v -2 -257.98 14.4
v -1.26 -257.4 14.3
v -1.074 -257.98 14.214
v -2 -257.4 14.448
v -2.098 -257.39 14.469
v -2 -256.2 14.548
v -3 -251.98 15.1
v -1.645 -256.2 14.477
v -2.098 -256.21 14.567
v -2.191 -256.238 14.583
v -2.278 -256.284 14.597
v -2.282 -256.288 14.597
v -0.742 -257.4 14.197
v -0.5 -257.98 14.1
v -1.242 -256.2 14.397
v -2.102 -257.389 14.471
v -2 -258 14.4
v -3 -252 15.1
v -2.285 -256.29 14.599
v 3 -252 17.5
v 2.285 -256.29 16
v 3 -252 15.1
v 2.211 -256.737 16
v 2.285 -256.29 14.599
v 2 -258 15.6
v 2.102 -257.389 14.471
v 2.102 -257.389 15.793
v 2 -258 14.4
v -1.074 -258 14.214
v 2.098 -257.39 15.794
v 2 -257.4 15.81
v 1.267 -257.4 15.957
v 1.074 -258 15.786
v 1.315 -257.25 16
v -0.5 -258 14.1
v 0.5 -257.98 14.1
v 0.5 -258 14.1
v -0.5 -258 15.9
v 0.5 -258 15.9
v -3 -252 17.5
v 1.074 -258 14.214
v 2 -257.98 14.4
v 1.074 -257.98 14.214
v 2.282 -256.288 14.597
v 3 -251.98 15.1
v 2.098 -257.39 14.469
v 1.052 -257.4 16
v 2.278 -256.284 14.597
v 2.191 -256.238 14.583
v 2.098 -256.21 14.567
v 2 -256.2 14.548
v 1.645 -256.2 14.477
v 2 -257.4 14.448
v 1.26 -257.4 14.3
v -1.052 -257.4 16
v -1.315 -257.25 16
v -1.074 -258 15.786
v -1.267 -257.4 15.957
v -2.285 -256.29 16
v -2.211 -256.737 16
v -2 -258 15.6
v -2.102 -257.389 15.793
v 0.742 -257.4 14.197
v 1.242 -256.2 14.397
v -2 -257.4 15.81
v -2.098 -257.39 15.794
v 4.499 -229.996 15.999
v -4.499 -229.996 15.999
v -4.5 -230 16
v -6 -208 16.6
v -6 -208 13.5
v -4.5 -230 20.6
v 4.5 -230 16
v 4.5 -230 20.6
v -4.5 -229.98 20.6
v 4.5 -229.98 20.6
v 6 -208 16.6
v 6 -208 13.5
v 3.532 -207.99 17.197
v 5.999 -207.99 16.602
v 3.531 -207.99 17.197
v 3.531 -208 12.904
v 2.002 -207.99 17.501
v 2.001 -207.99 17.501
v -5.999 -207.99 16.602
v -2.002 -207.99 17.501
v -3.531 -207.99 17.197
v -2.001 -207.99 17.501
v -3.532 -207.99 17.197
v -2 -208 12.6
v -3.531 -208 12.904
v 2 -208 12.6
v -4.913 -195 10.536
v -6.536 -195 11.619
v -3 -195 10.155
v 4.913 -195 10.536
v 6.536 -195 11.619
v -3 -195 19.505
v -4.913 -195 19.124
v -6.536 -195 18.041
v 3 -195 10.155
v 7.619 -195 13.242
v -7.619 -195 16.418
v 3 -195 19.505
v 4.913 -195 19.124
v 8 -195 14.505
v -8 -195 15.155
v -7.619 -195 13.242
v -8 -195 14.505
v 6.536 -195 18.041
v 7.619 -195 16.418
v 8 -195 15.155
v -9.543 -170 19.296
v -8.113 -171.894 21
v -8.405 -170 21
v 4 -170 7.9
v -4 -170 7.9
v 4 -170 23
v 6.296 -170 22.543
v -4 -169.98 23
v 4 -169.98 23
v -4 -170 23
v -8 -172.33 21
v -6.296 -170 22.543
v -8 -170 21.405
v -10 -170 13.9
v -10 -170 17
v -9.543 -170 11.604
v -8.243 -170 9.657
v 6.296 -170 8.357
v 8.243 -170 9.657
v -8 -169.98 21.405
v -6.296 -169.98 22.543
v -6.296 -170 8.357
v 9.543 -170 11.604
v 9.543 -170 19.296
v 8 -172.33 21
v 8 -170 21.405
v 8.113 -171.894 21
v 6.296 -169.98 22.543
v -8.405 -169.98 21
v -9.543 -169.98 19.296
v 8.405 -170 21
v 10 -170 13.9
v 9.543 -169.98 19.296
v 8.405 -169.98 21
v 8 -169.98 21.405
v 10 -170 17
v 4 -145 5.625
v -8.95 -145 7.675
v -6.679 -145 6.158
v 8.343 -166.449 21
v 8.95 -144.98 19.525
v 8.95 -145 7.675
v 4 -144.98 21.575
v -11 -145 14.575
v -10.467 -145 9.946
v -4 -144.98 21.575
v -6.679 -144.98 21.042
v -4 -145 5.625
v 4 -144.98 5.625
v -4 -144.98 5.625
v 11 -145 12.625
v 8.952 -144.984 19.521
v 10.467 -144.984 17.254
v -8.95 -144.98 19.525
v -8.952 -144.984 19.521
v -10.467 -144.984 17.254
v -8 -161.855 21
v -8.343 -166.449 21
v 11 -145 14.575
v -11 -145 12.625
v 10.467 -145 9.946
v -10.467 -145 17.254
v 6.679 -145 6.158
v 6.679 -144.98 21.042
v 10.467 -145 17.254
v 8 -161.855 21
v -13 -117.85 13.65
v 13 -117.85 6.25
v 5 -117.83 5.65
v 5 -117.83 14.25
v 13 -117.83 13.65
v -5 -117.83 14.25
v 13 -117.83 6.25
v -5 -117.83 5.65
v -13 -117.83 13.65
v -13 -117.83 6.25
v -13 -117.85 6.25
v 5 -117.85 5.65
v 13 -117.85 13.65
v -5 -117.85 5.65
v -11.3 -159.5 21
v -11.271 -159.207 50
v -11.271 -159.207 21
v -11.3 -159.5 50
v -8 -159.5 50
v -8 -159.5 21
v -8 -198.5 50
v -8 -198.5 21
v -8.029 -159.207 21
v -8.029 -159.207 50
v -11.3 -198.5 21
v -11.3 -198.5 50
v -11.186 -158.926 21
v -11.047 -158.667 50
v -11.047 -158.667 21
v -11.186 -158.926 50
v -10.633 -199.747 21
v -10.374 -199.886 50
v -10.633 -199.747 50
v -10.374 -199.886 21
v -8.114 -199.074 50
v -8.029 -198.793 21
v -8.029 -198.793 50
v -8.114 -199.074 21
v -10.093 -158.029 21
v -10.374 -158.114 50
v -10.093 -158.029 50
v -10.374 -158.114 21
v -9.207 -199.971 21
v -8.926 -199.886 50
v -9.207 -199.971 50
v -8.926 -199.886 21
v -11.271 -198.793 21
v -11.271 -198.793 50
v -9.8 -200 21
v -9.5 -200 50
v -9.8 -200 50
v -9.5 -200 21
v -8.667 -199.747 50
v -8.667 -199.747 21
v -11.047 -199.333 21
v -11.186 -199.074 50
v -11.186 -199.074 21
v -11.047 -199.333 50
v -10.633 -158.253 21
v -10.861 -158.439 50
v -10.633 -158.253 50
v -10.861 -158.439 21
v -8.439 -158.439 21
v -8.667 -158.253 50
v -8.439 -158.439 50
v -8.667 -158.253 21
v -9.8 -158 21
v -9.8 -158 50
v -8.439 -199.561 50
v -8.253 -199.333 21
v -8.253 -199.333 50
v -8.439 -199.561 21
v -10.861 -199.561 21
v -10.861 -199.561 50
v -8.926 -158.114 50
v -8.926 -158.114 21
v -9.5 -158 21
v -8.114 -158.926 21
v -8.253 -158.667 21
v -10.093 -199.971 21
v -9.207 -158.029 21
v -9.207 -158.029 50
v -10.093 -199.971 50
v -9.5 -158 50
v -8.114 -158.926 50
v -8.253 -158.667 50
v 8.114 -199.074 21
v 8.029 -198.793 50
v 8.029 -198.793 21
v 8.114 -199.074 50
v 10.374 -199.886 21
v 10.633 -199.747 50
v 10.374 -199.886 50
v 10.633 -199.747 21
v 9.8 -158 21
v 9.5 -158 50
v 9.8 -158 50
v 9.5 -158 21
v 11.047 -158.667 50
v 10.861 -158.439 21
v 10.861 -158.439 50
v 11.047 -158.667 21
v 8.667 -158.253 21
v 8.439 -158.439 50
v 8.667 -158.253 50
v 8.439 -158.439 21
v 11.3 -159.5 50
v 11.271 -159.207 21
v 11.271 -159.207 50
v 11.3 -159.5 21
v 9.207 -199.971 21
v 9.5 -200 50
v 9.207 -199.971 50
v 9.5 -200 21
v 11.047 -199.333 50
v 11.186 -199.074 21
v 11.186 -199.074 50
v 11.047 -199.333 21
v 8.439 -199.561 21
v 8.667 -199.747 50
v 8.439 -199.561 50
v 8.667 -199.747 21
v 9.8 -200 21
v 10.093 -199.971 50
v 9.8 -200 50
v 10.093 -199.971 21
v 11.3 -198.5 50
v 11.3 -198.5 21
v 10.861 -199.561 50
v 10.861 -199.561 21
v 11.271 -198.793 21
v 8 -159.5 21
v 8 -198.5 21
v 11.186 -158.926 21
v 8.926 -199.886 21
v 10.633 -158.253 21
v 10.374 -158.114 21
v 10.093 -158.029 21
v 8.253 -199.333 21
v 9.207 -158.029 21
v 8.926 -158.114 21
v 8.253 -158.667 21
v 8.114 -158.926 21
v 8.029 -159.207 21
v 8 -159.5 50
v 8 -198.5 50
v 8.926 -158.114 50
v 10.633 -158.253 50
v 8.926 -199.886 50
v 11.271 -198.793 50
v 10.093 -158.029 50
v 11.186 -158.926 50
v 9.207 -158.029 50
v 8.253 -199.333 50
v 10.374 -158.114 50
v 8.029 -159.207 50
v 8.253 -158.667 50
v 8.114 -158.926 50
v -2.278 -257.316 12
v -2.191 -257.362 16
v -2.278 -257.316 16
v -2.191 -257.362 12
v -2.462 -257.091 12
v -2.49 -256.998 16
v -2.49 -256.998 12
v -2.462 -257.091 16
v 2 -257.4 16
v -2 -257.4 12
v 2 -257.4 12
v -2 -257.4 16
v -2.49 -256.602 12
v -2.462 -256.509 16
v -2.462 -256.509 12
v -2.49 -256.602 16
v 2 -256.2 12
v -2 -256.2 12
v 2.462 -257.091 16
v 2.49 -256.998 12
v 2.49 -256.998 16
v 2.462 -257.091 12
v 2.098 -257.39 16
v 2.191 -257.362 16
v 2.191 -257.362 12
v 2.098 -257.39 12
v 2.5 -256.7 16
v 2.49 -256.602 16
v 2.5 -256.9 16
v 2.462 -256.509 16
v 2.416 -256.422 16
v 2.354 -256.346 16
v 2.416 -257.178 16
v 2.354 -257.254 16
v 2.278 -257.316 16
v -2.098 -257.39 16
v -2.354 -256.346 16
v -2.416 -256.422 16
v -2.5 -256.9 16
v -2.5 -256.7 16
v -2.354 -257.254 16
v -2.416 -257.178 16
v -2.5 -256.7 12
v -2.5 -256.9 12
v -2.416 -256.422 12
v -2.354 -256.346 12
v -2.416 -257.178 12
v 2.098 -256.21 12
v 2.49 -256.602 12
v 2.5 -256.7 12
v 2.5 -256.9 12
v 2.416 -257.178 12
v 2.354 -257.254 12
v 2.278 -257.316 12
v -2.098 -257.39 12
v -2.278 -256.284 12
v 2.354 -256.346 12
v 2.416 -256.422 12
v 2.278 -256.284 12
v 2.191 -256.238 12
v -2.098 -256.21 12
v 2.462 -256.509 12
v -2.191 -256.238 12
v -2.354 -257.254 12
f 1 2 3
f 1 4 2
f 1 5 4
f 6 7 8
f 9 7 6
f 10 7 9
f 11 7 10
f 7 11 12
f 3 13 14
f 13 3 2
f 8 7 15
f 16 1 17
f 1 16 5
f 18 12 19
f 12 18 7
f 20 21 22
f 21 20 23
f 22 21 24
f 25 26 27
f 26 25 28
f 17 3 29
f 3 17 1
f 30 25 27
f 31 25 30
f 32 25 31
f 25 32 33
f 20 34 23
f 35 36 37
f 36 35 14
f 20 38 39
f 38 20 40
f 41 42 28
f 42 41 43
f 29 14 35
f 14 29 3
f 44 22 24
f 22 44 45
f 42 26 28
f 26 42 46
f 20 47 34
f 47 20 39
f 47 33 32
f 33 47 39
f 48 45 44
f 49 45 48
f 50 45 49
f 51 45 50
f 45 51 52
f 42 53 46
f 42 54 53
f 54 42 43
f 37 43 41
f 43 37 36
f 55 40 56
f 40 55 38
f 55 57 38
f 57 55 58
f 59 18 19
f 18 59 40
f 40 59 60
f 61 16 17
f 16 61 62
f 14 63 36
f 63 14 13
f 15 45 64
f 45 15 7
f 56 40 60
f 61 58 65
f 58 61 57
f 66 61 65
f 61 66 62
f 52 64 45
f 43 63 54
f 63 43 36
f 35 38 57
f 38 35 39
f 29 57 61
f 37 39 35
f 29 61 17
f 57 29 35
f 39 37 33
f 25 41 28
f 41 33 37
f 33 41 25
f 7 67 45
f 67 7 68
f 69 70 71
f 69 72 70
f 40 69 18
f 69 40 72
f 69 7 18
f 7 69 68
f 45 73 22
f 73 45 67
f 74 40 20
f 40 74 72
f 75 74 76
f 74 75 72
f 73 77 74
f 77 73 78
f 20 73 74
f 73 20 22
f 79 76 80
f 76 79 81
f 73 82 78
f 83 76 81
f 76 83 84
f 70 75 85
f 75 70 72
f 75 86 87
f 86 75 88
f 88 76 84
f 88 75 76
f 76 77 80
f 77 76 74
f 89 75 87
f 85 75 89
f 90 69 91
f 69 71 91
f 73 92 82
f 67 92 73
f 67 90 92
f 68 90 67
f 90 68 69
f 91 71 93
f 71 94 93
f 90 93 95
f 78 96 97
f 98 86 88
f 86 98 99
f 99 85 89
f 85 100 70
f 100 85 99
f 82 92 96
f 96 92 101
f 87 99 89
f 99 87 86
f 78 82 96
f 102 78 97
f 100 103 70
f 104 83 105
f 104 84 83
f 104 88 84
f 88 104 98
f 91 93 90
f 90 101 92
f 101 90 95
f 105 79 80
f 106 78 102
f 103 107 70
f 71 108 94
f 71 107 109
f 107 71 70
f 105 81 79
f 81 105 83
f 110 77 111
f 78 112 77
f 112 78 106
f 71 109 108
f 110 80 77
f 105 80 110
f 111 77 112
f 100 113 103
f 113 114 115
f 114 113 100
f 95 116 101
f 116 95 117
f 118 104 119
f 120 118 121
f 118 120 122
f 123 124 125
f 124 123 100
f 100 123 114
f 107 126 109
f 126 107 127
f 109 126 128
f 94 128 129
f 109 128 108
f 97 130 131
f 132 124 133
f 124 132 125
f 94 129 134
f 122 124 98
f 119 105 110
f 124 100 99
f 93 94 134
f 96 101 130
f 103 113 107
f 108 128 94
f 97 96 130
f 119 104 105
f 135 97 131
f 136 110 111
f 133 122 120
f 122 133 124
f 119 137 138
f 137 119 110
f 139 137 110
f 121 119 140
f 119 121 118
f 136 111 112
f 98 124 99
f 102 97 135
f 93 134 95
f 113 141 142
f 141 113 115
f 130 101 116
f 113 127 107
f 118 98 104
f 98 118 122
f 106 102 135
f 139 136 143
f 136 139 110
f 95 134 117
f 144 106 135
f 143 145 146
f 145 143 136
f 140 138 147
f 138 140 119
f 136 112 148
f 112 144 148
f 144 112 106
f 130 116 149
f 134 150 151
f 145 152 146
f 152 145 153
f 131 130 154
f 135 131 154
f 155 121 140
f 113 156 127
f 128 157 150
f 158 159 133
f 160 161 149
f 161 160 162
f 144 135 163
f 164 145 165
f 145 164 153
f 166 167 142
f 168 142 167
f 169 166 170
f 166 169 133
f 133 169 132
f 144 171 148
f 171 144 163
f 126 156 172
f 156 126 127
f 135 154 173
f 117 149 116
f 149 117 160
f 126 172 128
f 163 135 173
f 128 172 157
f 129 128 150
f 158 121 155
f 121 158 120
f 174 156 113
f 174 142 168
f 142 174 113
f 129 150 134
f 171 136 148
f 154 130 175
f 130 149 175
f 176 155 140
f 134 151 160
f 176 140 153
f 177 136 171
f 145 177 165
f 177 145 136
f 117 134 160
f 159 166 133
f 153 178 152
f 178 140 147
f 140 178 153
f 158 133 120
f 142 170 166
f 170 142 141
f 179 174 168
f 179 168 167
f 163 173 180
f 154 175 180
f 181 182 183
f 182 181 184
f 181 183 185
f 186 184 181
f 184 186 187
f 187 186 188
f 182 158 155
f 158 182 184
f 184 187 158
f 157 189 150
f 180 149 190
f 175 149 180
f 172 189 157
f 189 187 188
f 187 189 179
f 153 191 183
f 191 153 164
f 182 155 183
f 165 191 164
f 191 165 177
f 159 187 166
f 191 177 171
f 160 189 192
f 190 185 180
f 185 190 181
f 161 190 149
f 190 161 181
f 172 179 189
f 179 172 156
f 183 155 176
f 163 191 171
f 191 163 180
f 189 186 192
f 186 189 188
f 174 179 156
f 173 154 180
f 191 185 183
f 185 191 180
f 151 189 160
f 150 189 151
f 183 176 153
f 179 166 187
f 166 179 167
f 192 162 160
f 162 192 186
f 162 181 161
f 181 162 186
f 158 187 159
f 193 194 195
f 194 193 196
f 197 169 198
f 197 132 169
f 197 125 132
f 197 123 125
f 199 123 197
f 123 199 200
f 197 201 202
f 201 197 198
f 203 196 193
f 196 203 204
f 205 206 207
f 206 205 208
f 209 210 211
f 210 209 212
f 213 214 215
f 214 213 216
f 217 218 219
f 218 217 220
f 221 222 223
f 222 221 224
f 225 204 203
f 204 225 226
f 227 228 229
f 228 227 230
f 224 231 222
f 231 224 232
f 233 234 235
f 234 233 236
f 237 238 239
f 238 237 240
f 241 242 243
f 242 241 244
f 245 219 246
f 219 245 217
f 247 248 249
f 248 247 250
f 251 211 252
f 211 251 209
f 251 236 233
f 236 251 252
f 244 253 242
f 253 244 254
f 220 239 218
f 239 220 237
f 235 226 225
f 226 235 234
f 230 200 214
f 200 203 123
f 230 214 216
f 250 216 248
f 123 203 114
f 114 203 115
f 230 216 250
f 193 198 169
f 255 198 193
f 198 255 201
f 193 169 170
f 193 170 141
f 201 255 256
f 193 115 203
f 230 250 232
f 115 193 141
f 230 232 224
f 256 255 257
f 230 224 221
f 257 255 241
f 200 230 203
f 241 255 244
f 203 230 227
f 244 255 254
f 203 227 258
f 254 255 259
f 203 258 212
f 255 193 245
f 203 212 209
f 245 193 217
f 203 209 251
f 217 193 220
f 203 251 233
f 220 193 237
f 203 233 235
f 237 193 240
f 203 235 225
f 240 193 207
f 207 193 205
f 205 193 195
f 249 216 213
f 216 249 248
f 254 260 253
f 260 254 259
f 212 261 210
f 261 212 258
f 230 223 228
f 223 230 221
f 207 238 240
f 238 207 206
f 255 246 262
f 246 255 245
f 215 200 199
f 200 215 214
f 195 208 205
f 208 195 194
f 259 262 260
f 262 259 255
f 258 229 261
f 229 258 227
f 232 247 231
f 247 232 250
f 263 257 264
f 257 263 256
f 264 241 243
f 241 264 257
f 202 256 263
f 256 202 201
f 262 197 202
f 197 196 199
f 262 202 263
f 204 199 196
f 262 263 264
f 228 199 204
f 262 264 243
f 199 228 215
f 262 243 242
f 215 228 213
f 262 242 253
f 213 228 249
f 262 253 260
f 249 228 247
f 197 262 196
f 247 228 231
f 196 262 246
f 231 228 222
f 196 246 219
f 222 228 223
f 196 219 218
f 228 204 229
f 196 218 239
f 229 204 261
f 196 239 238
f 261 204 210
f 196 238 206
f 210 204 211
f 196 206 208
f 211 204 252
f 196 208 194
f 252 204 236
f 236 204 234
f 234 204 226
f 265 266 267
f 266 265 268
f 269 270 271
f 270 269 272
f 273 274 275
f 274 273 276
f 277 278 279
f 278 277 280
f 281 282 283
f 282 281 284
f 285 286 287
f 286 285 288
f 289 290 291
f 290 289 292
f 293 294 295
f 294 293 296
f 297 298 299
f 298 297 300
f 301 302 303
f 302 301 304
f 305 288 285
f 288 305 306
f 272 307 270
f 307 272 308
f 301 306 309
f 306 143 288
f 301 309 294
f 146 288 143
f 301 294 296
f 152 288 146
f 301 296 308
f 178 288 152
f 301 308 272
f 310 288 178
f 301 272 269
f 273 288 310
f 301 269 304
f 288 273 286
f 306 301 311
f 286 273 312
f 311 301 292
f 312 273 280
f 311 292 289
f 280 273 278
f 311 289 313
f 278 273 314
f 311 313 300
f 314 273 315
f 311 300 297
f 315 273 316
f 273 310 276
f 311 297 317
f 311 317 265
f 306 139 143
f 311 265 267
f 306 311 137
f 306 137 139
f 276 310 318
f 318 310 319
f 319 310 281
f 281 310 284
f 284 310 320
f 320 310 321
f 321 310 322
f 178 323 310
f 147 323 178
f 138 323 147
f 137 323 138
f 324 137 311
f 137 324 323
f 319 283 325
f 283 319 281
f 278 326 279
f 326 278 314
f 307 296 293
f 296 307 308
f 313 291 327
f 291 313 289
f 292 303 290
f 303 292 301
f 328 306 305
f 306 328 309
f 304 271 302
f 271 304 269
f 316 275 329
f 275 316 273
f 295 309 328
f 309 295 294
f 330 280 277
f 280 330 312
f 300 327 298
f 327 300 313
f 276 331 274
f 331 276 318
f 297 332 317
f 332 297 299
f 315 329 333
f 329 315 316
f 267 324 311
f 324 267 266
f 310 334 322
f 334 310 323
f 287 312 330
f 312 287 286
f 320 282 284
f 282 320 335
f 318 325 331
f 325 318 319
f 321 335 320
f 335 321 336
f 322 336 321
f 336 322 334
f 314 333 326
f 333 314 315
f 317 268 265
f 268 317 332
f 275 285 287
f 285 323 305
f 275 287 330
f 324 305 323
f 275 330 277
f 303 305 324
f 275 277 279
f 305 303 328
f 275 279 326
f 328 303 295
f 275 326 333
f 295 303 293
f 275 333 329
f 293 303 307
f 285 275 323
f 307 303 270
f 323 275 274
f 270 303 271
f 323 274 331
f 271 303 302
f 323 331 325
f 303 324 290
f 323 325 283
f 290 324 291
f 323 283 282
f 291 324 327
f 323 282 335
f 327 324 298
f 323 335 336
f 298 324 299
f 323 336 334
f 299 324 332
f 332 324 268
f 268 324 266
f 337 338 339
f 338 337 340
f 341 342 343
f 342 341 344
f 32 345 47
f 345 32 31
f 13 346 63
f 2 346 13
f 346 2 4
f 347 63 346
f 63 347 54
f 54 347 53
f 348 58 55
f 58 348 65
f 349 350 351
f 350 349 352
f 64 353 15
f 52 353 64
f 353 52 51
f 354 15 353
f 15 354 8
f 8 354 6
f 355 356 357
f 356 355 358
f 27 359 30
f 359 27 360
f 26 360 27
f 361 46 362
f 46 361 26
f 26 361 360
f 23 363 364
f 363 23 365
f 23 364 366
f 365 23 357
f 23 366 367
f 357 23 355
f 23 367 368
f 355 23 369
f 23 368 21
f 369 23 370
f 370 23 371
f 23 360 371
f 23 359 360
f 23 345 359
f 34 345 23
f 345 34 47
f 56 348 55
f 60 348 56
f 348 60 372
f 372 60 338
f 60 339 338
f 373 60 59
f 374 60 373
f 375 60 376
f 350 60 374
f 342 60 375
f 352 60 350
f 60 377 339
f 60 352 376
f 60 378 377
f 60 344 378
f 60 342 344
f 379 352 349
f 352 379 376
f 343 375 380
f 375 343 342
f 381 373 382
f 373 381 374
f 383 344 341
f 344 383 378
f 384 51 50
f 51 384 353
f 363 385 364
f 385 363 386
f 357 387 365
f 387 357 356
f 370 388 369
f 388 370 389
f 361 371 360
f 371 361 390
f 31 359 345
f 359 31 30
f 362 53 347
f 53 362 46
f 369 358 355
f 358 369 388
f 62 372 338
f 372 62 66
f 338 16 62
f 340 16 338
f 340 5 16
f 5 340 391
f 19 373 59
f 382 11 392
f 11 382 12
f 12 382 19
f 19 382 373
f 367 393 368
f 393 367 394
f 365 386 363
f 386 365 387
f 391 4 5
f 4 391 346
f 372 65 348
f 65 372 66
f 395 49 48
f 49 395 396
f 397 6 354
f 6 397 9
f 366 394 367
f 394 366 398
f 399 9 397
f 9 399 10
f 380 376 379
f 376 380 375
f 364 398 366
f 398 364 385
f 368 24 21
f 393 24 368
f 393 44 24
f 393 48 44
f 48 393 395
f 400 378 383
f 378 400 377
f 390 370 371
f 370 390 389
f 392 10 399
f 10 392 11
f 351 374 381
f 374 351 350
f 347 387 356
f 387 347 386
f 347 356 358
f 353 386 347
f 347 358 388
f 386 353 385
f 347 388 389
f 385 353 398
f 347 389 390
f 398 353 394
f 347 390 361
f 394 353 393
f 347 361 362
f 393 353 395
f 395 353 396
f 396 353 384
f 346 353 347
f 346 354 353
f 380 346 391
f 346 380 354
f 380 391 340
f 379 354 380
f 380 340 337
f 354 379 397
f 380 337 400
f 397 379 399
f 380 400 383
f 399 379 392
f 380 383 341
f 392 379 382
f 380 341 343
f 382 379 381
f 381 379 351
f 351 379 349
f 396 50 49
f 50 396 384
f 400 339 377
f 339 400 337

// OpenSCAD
// file: ../lib.scad
// ===== 공용 프리미티브 (params 의존 없음 — use로 포함. 함정 1) =====

// 두 점을 잇는 캡슐. 끝단이 od/2 만큼 뻗는다 (함정 3)
module rod(p1, p2, od, fn = 56)
    hull() { translate(p1) sphere(d = od, $fn = fn);
             translate(p2) sphere(d = od, $fn = fn); }

function mir(p, s = 1) = [s * p.x, p.y, p.z];

// --- 라운디드 사각 2D 폴리곤 (CCW) ---
function arc_pt(cx, cy, r, a) = [cx + r * cos(a), cy + r * sin(a)];
function rrpts(w, h, r, n = 4) =
    let (x = w / 2 - r, y = h / 2 - r)
    concat(
        [for (i = [0:n]) arc_pt( x, -y, r, -90 + 90 * i / n)],
        [for (i = [0:n]) arc_pt( x,  y, r,   0 + 90 * i / n)],
        [for (i = [0:n]) arc_pt(-x,  y, r,  90 + 90 * i / n)],
        [for (i = [0:n]) arc_pt(-x, -y, r, 180 + 90 * i / n)]);

// y 위치의 XZ 단면 슬래브 (중심 x0/zc, 폭 w/높이 h, 모서리 r).
// 회전 매핑: 2D x→차량 X, 2D y→차량 Z, 돌출 +z→−Y (y..y+0.02 전방 전용, 함정 20)
module slabr(y, x0, w, h, zc, r)
    translate([x0, y + 0.02, zc]) rotate([90, 0, 0])
        linear_extrude(0.02) polygon(rrpts(w, h, r));

// 단면 체인 loft: sec = [[y, x0, w, h, zc, r], ...]
module loftr(sec)
    for (i = [0 : len(sec) - 2])
        hull() {
            slabr(sec[i][0],     sec[i][1],     sec[i][2],     sec[i][3],     sec[i][4],     sec[i][5]);
            slabr(sec[i + 1][0], sec[i + 1][1], sec[i + 1][2], sec[i + 1][3], sec[i + 1][4], sec[i + 1][5]);
        }

// 라운디드 박스 (z0..z1 수직, 평면 모서리 r)
module rbox(xc, yc, z0, z1, dx, dy, r, fn = 32)
    hull() for (px = [-1, 1], py = [-1, 1])
        translate([xc + px * (dx / 2 - r), yc + py * (dy / 2 - r), z0])
            cylinder(r = r, h = z1 - z0, $fn = fn);

// --- NACA 계열 에어포일 (LE 원점, 2D +x = 현 방향) ---
function _yt(x, c, t) = 5 * t * c * (0.2969*sqrt(x) - 0.1260*x - 0.3516*x*x
    + 0.2843*x*x*x - 0.1036*x*x*x*x);
function _yc(x, c, m) = 4 * m * c * x * (1 - x);
function naca_pts(c, t, m, n = 12) =
    concat(
        [for (i = [0:n])     let (x = i / n)     [x*c,  _yt(x, c, t) + _yc(x, c, m)]],
        [for (i = [n-1:-1:0]) let (x = i / n)    [x*c, -_yt(x, c, t) + _yc(x, c, m)]]);

// 슬라이스 3D 링: v=[x, yle, zle, c, aoa, th, cam] → 받각 회전된 naca 점의 링
// (th/cam은 mm — 현 대비 비율로 정규화)
function wring(v, n = 12) =
    let (c = v[3], t = v[5] / c, m = v[6] / c, pts = naca_pts(c, t, m, n),
         ca = cos(v[4]), sa = sin(v[4]))
    // 코드 방향 (ca,sa) + 두께/캠버 수직 방향 (-sa,ca) — 2D y 누락 금지
    [for (p = pts) [v[0], v[1] + p[0] * ca - p[1] * sa, v[2] + p[0] * sa + p[1] * ca]];

// 진짜 로프트 윙 — polyhedron 스트립. hull 체인은 캠버진 하면을 볼록 껍질로
// 채워(LE→TE 직선 웨지) 요소가 처지므로 쓰지 않는다
module wing3(sl, n = 12) {
    rings = [for (v = sl) wring(v, n)];
    ns = len(rings);
    m = len(rings[0]);
    pts = [for (r = rings, p = r) p];
    function ix(i, k) = i * m + (k % m);
    faces = concat(
        // 측면 스트립 (사중면 → 삼각형 2) — 외향 노멀 권선(캡과 일치)
        [for (i = [0 : ns - 2], k = [0 : m - 1])
            each [[ix(i, k), ix(i, k + 1), ix(i + 1, k + 1)],
                  [ix(i, k), ix(i + 1, k + 1), ix(i + 1, k)]]],
        // 끝 캡 (링은 단순 폴리곤 — 팬 삼각분할)
        [for (k = [1 : m - 2]) [ix(0, 0), ix(0, k + 1), ix(0, k)]],
        [for (k = [1 : m - 2]) [ix(ns - 1, 0), ix(ns - 1, k), ix(ns - 1, k + 1)]]
    );
    polyhedron(points = pts, faces = faces, convexity = 4);
}

// 반쪽 슬라이스 → x-대칭 전체. 규약: half는 센터(x=0)→팁 순서(내림차순 x).
// 결과는 x 오름차순 체인. x=0 센터만 중복 제외 (그 외 전부 미러)
function wsym(half) =
    concat([for (i = [len(half) - 1 : -1 : 0]) half[i]],
           [for (i = [0 : len(half) - 1]) if (abs(half[i][0]) > 1e-9)
               concat([-half[i][0]], [for (j = [1 : len(half[i]) - 1]) half[i][j]])]);

// 환(링), 축 Z
module ann(r_in, r_out, h, fn = 96)
    difference() { cylinder(r = r_out, h = h, center = true, $fn = fn);
                   cylinder(r = r_in,  h = h + 2, center = true, $fn = fn); }

// 리스트 전체 x반전+순서 역행 (센터 구간 없는 플랩 등 — 좌우 별도 wing3 호출용).
// x반전만 하면 행렬식이 음수가 되어 권선이 뒤집힌다 → 순서 역행으로 상쇄
function msym(half) =
    [for (i = [len(half) - 1 : -1 : 0])
        concat([-half[i][0]], [for (j = [1 : len(half[i]) - 1]) half[i][j]])];
// file: ../params.scad
// =====================================================================
// F1 그랜드파이언스 카 1:10 — 전체 파라미터 (유일한 수정 지점)
// 좌표계: +Y 전방, +X 좌측, +Z 상방, 지면 z=0, 원점=휠베이스 중심
// 전장 558 (y -268..+278), 전폭 194, 휠베이스 360, 타이어 OD 72 (720mm)
// 30부품. loftr 단면 = [y, x0, w, h, zc, r] (XZ 단면, y..y+0.02 슬래브)
// wing3 슬라이스 = [x, yle, zle, c, aoa, th, cam]
//   aoa: 현 방향의 X축 회전각. 전방 받각 요소는 165~170 (TE가 뒤+위)
// =====================================================================
$fn = 96;

// -- 휠/액슬 (실차 720mm 타이어, 18인치 림, 트랙 F1600/R1550) --
AXF_Y = 180;   AXR_Y = -180;
WHF_X = 80;    WHR_X = 77.5;
WH_Z  = 36;
TIRF_W = 30.5; TIRR_W = 40.5;  TIR_R = 36;
TIR_FN = 288;                 // 타이어 회전체 해상도
RIM_R = 23.2;  RIM_T = 1.0;   // 림 배럴 반경/두께
RIM_LF = 12.4; RIM_LR = 17.4; // 림 배럴 반폭
HUB_BORE = 7.0; STUB_D = 6.2; // 방사 간극 0.4
DISC_R = 15.5;                // 브레이크 디스크

// -- 바디 공통 레벨 --
FLO_Z0 = 2.0;  FLO_Z1 = 5.5;  // 플로어 (두께 3.5)
BOD_Z0 = 5.65;                // 샤시/카버/기어박스 바닥 (플로어 위 0.15)
J = 0.15;                     // 부품 접합 기본 간극
ARM_OD = 3.4;                 // 서스펜션 암 캡슐 직경

// ===== 01 플로어 =====
FLOOR_SEC = [
    [132,    0,  92, 3.5, 3.75, 1.5], [100, 0, 118, 3.5, 3.75, 1.5],
    [60,     0, 130, 3.5, 3.75, 2.0], [10,  0, 132, 3.5, 3.75, 2.0],
    [-60,    0, 128, 3.5, 3.75, 2.0], [-120, 0, 112, 3.5, 3.75, 2.0],
    [-161.85, 0, 100, 3.5, 3.75, 2.0]];

// ===== 02 디퓨저 (램프 + 스트레이크는 부품 내부) =====
DIFF_SEC = [
    [-230,   0, 100, 10.0, 11.0, 1.5], [-215, 0, 100, 8.0,  9.0, 1.5],
    [-190,   0, 100,  6.0,  6.2, 1.5], [-162.0, 0, 100, 4.0, 4.15, 1.5]];
DIFF_TOP = [[-175, 7.8], [-205, 11.9], [-228, 15.6]];  // (y, 램프 상면 z)

// ===== 03 플로어 에지 윙 =====
FEW_SEC = [   // [y, x0, w, h, zc, r] — x0 부호로 좌우
    [55,   63.5, 3.0, 2.0, 6.65, 1.0], [-5,  65.5, 3.0, 5.5, 8.40, 1.5],
    [-70,  63.0, 3.0, 4.0, 7.65, 1.5], [-120, 58.0, 3.0, 3.0, 7.15, 1.5]];
FEW2_SEC = [
    [100, 57.0, 2.5, 1.5, 6.40, 0.8], [60, 60.0, 2.5, 2.0, 6.65, 0.8]];

// ===== 04 노우즈 =====
NOSE_SEC = [
    [95,   0, 38, 28, 25.3, 12], [100,  0, 38, 29, 25.3, 12],
    [115,  0, 36, 28, 23.8, 11], [135,  0, 31, 24, 21.3,  9],
    [160,  0, 27, 20, 18.3,  8], [185,  0, 23, 17, 15.8,  7],
    [205,  0, 20, 15, 14.3,  6], [224,  0, 17, 12, 12.3,  5],
    [242,  0, 14,  9, 10.8,  4], [258,  0, 10,  7, 10.1,  3],
    [272,  0,  4.5, 4.5, 9.8, 2], [273.5, 0, 1.2, 1.2, 9.8, 0.6]];

// ===== 05 샤시(모노코크) + 콕핏 컷 =====
CHAS_SEC = [
    [-34.85, 0, 46, 44, 27.65, 15], [-10, 0, 48, 46, 28.65, 15],
    [20,     0, 48, 44, 27.65, 15], [60,  0, 46, 40, 25.65, 14],
    [94.85,  0, 42, 34, 22.65, 12]];
CKP_CUT = [[62, 0, 34, 32, 46, 3], [-30, 0, 34, 30, 45, 3]];

// ===== 06 엔진 커버 + 샤크핀 =====
COV_SEC = [
    [-152,   0,  8, 14, 35.65,  6], [-140, 0, 12, 18, 32.65,  7],
    [-120,   0, 18, 24, 29.65,  9], [-95,  0, 26, 30, 26.15, 11],
    [-70,    0, 34, 36, 25.65, 13], [-50,  0, 40, 40, 25.65, 14],
    [-35.15, 0, 44, 42, 26.65, 15]];
FIN_SEC = [
    [-162, 0, 2.2, 44, 62.0, 1], [-120, 0, 2.5, 30, 56.0, 1],
    [-92.2, 0, 2.5, 10, 45.0, 1]];

// ===== 07 에어박스 (험프 + 인테이크 링) =====
ABX_SEC = [
    [-92, 0, 14, 17, 50.00, 6], [-68, 0, 20, 24, 56.60, 8],
    [-46, 0, 22, 26, 59.60, 8], [-34, 0, 22, 13, 56.30, 6]];
ABX_RING_C = [0, -45, 73.5];  ABX_RING_R = 11;  ABX_RING_T = 4.5;
ABX_RING_SZ = 0.72;

// ===== 08 사이드포드 (x0=±41.5) =====
SPOD_X0 = 41.5;
SPOD_SEC = [   // [y, w, h, zc, r]
    [38,   34, 26, 18.65, 8], [5,   34, 28, 19.65, 9], [-25,  34, 26, 18.65, 9],
    [-55,  32, 21, 18.15, 8], [-80, 30, 15, 17.15, 8], [-100, 26,  9, 16.15, 7]];
SPOD_INLET = [24, 18, 19, 2.3];  // 컷: w, h, zc, 깊이

// ===== 09 할로 =====
HALO_N = 28;  HALO_OD = 9;
HALO_RX = 22; HALO_RY = 44; HALO_CY = 12;  // 타원 계획면(평면도)
HALO_Z0 = 75; HALO_ZA = 2;                 // z(t) = Z0 + ZA*cos(t)

// ===== 10/11/12/13 프런트 윙 =====
FW_MAIN_HALF = [   // 반쪽(x≤0) — wsym()로 전체화
    [0,    258.3, 2.4, 20, 170, 1.4, 2.0],
    [-16,  259.0, 3.4, 27, 165, 1.6, 2.4],
    [-40,  260.0, 3.6, 40, 166, 1.8, 2.8],
    [-60,  257.0, 4.0, 37, 167, 1.7, 2.6],
    [-80,  258.0, 4.4, 31, 166, 1.6, 2.2],
    [-95.2, 263.0, 4.6, 26, 166, 1.5, 1.8]];
FW_F1_HALF = [
    [-16,  253.0, 8.0, 22, 155, 1.3, 4.0],
    [-40,  250.5, 8.2, 26, 156, 1.4, 4.2],
    [-60,  249.5, 8.4, 26, 157, 1.4, 4.2],
    [-80,  250.0, 8.6, 24, 158, 1.4, 4.0],
    [-95.2, 254.0, 8.8, 21, 158, 1.3, 3.5]];
FW_F2_HALF = [
    [-16,  258.0, 12.4, 17, 147, 1.2, 4.5],
    [-40,  255.5, 12.6, 20, 148, 1.3, 4.8],
    [-60,  254.5, 12.8, 20, 149, 1.3, 4.8],
    [-80,  254.5, 13.0, 19, 150, 1.3, 4.5],
    [-95.2, 258.0, 13.2, 17, 150, 1.2, 4.0]];
FW_EP_X = 96.3;  FW_EP_T = 1.5;   // 엔드플레이트 x 중심/두께
FW_EP_PTS = [    // (y,z) 아웃라인
    [226, 1.5], [266, 1.5], [266, 8], [263, 24.5], [252, 24.5],
    [244, 17], [233, 15], [226, 9]];
FW_MT_SEC = [   // 마운트 플레이트 [y, x0(±2.6), w, h, zc, r] — 노우즈 저면 라운딩 회피
    [244, 2.6, 1.6, 1.8, 5.25, 0.5], [250, 2.6, 1.6, 1.8, 5.25, 0.5]];

// ===== 14 리어 윙 =====
RW_MAIN = [
    [-50.8, -212, 57.5, 46, 162, 2.2, -3.5], [-25, -211, 56.6, 47, 162, 2.3, -4.0],
    [0,     -210, 54.2, 47, 162, 2.3, -4.0], [25,  -211, 56.6, 47, 162, 2.3, -4.0],
    [50.8,  -212, 57.5, 46, 162, 2.2, -3.5]];
RW_FLAP = [
    [-49.6, -234,   71.8, 30, 155, 1.8, -4.5],
    [0,     -235.5, 73.0, 30, 155, 1.8, -4.5],
    [49.6,  -234,   71.8, 30, 155, 1.8, -4.5]];
RW_EP_X = 52;  RW_EP_T = 2;
RW_EP_PTS = [
    [-200, 46], [-268, 46], [-268, 60], [-262, 93], [-250, 93],
    [-243, 72], [-218, 64], [-202, 74]];
RW_DRS = [-245, 79.4, 5.0, 2.6, 3.0];   // 팟: y, z, w, h, 두께

// ===== 15 빔 윙 =====
BEAM_E1 = [
    [-50.9, -204.5, 31.5, 16, 162, 1.8, -2.5], [0, -205.5, 30.4, 16, 162, 1.8, -2.5],
    [50.9,  -204.5, 31.5, 16, 162, 1.8, -2.5]];
BEAM_E2 = [
    [-50.9, -210, 36.8, 15, 158, 1.6, -3.0], [0, -211, 35.6, 15, 158, 1.6, -3.0],
    [50.9,  -210, 36.8, 15, 158, 1.6, -3.0]];
BEAM_PLATE = [-214, -200.15, 8.2, 22, 31];  // 마운트 플레이트 y1,y0,x반폭,z0,z1

// ===== 16 리어윙 파일론(쌍둥 스완넥) =====
RW_PYL = [[-158, 55.0], [-190, 58.0], [-212.5, 63.0]];  // (y, z), x=±5.4
RW_PYL_X = 5.4;  RW_PYL_OD = 8;

// ===== 17 미러 =====
MIR_BASE = [14, 63, 46.0];  MIR_HOUSE = [31, 66, 56.5];

// ===== 18 헬멧 =====
HELM_C = [0, 0, 55];  HELM_R = 11.5;
HELM_SC = [1, 1.18, 1.02];

// ===== 19 콕핏 트림 =====
SEAT_SEC  = [[30, 0, 26, 13.2, 36.75, 3], [-10, 0, 26, 13.2, 36.75, 3]];
HREST_SEC = [[12, 0, 32, 15, 53.5, 5], [-20, 0, 32, 15, 53.5, 5]];

// ===== 20 스티어링 휠 =====
SW_C = [0, 40, 47];  SW_TILT = 20;

// ===== 21/22 서스펜션 (픽업=[x, y, z], 암 끝은 업라이트 내부) =====
FUP = [61, 183, 46];  FLO_BALL = [61.5, 181, 24];  FTR = [61.5, 177, 35];
FPU = [61.5, 180, 27];
F_ARM = [   // [픽업, 볼]
    [[12.0, 206, 20.0], FUP],  [[16.0, 152, 23.0], FUP],
    [[11.9, 208,  9.3], FLO_BALL], [[16.3, 150, 12.0], FLO_BALL],
    [[15.6, 162, 14.0], FTR]];
F_PUSH = [[11.8, 198, 24.4], FPU];
RUP = [53.5, -182, 46];  RLO = [54, -179, 23];  RDRIVE_O = [52, -180, 31];
R_ARM = [
    [[13.3, -160, 47.0], RUP], [[13.3, -198, 45.0], RUP],
    [[12.8, -158, 20.4], RLO], [[9.2, -202, 19.6], RLO]];
R_PULL = [[12.6, -177, 23.75], [53.5, -181, 44]];
R_DRIVE = [[13.2, -180, 17.0], RDRIVE_O];

// ===== 23/24 브레이크 스쿱 =====
SCOOP_F = [[164.2, 59.5, 7, 11, 30, 3], [158, 58.5, 5.5, 8, 28.5, 2.5]];
SCOOP_R = [[-164.2, 48, 7, 10, 29, 3], [-158, 46, 5, 7.5, 27.5, 2.5]];

// ===== 25~28 타이어/림 =====
TIRE_BEAD = 2.6;   // 비드 안쪽 세팅 (단면 반경 23.4)

// ===== 29 기어박스 + 리어 크래시 =====
GEAR_SEC = [
    [-258,   0,  4,  1.8, 15.00, 1.5], [-252, 0,  6,  1.6, 16.30, 2],
    [-230,   0,  9,  1.4, 18.30, 3],   [-208, 0, 12,  4.9, 15.05, 4],
    [-195,   0, 16,  9.35, 14.83, 5],   [-170, 0, 20, 15.1, 15.45, 6],
    [-145,   0, 22, 15.95, 13.60, 7],  [-117.85, 0, 26, 8.6,  9.95, 8]];
GEAR_TOWER = [-200, -158, 8, 11.3, 28, 50];  // y1,y0,x내측,x외측,z0,z1
RAIN_LT = [-258.6, 5, 4];   // y면, w, h

// ===== 30 카메라/안테나 =====
TCAM_Y = -45;  TCAM_Z0 = 84.8;
SIDECAM = [[194, 19.0], [202, 18.5]];  // (y, z) — x는 노우즈 반폭+0.15
ANT = [[4, 70], [-4, 70]];             // (x, y) — chassis 탑
// main file
// 29 기어박스 + 리어 크래시 구조 — 테이퍼 블록 + 서스펜션 타워 + 레인 라이트
include <../params.scad>
use <../lib.scad>

module gearbox_crash() {
    loftr(GEAR_SEC);
    // 서스펜션 타워 ±(어퍼 위시본 픽업, 기부는 기어박스에 매립) — r은 dx/2 미만
    for (s = [-1, 1]) rbox(s * 9.65, -179, 21, 50, 3.3, 42, 1.5);
    // 레인 라이트 포드 (테일 단부)
    rbox(0, -256.8, 12, 16, RAIN_LT[1], 1.2, 0.5);
}

gearbox_crash();
